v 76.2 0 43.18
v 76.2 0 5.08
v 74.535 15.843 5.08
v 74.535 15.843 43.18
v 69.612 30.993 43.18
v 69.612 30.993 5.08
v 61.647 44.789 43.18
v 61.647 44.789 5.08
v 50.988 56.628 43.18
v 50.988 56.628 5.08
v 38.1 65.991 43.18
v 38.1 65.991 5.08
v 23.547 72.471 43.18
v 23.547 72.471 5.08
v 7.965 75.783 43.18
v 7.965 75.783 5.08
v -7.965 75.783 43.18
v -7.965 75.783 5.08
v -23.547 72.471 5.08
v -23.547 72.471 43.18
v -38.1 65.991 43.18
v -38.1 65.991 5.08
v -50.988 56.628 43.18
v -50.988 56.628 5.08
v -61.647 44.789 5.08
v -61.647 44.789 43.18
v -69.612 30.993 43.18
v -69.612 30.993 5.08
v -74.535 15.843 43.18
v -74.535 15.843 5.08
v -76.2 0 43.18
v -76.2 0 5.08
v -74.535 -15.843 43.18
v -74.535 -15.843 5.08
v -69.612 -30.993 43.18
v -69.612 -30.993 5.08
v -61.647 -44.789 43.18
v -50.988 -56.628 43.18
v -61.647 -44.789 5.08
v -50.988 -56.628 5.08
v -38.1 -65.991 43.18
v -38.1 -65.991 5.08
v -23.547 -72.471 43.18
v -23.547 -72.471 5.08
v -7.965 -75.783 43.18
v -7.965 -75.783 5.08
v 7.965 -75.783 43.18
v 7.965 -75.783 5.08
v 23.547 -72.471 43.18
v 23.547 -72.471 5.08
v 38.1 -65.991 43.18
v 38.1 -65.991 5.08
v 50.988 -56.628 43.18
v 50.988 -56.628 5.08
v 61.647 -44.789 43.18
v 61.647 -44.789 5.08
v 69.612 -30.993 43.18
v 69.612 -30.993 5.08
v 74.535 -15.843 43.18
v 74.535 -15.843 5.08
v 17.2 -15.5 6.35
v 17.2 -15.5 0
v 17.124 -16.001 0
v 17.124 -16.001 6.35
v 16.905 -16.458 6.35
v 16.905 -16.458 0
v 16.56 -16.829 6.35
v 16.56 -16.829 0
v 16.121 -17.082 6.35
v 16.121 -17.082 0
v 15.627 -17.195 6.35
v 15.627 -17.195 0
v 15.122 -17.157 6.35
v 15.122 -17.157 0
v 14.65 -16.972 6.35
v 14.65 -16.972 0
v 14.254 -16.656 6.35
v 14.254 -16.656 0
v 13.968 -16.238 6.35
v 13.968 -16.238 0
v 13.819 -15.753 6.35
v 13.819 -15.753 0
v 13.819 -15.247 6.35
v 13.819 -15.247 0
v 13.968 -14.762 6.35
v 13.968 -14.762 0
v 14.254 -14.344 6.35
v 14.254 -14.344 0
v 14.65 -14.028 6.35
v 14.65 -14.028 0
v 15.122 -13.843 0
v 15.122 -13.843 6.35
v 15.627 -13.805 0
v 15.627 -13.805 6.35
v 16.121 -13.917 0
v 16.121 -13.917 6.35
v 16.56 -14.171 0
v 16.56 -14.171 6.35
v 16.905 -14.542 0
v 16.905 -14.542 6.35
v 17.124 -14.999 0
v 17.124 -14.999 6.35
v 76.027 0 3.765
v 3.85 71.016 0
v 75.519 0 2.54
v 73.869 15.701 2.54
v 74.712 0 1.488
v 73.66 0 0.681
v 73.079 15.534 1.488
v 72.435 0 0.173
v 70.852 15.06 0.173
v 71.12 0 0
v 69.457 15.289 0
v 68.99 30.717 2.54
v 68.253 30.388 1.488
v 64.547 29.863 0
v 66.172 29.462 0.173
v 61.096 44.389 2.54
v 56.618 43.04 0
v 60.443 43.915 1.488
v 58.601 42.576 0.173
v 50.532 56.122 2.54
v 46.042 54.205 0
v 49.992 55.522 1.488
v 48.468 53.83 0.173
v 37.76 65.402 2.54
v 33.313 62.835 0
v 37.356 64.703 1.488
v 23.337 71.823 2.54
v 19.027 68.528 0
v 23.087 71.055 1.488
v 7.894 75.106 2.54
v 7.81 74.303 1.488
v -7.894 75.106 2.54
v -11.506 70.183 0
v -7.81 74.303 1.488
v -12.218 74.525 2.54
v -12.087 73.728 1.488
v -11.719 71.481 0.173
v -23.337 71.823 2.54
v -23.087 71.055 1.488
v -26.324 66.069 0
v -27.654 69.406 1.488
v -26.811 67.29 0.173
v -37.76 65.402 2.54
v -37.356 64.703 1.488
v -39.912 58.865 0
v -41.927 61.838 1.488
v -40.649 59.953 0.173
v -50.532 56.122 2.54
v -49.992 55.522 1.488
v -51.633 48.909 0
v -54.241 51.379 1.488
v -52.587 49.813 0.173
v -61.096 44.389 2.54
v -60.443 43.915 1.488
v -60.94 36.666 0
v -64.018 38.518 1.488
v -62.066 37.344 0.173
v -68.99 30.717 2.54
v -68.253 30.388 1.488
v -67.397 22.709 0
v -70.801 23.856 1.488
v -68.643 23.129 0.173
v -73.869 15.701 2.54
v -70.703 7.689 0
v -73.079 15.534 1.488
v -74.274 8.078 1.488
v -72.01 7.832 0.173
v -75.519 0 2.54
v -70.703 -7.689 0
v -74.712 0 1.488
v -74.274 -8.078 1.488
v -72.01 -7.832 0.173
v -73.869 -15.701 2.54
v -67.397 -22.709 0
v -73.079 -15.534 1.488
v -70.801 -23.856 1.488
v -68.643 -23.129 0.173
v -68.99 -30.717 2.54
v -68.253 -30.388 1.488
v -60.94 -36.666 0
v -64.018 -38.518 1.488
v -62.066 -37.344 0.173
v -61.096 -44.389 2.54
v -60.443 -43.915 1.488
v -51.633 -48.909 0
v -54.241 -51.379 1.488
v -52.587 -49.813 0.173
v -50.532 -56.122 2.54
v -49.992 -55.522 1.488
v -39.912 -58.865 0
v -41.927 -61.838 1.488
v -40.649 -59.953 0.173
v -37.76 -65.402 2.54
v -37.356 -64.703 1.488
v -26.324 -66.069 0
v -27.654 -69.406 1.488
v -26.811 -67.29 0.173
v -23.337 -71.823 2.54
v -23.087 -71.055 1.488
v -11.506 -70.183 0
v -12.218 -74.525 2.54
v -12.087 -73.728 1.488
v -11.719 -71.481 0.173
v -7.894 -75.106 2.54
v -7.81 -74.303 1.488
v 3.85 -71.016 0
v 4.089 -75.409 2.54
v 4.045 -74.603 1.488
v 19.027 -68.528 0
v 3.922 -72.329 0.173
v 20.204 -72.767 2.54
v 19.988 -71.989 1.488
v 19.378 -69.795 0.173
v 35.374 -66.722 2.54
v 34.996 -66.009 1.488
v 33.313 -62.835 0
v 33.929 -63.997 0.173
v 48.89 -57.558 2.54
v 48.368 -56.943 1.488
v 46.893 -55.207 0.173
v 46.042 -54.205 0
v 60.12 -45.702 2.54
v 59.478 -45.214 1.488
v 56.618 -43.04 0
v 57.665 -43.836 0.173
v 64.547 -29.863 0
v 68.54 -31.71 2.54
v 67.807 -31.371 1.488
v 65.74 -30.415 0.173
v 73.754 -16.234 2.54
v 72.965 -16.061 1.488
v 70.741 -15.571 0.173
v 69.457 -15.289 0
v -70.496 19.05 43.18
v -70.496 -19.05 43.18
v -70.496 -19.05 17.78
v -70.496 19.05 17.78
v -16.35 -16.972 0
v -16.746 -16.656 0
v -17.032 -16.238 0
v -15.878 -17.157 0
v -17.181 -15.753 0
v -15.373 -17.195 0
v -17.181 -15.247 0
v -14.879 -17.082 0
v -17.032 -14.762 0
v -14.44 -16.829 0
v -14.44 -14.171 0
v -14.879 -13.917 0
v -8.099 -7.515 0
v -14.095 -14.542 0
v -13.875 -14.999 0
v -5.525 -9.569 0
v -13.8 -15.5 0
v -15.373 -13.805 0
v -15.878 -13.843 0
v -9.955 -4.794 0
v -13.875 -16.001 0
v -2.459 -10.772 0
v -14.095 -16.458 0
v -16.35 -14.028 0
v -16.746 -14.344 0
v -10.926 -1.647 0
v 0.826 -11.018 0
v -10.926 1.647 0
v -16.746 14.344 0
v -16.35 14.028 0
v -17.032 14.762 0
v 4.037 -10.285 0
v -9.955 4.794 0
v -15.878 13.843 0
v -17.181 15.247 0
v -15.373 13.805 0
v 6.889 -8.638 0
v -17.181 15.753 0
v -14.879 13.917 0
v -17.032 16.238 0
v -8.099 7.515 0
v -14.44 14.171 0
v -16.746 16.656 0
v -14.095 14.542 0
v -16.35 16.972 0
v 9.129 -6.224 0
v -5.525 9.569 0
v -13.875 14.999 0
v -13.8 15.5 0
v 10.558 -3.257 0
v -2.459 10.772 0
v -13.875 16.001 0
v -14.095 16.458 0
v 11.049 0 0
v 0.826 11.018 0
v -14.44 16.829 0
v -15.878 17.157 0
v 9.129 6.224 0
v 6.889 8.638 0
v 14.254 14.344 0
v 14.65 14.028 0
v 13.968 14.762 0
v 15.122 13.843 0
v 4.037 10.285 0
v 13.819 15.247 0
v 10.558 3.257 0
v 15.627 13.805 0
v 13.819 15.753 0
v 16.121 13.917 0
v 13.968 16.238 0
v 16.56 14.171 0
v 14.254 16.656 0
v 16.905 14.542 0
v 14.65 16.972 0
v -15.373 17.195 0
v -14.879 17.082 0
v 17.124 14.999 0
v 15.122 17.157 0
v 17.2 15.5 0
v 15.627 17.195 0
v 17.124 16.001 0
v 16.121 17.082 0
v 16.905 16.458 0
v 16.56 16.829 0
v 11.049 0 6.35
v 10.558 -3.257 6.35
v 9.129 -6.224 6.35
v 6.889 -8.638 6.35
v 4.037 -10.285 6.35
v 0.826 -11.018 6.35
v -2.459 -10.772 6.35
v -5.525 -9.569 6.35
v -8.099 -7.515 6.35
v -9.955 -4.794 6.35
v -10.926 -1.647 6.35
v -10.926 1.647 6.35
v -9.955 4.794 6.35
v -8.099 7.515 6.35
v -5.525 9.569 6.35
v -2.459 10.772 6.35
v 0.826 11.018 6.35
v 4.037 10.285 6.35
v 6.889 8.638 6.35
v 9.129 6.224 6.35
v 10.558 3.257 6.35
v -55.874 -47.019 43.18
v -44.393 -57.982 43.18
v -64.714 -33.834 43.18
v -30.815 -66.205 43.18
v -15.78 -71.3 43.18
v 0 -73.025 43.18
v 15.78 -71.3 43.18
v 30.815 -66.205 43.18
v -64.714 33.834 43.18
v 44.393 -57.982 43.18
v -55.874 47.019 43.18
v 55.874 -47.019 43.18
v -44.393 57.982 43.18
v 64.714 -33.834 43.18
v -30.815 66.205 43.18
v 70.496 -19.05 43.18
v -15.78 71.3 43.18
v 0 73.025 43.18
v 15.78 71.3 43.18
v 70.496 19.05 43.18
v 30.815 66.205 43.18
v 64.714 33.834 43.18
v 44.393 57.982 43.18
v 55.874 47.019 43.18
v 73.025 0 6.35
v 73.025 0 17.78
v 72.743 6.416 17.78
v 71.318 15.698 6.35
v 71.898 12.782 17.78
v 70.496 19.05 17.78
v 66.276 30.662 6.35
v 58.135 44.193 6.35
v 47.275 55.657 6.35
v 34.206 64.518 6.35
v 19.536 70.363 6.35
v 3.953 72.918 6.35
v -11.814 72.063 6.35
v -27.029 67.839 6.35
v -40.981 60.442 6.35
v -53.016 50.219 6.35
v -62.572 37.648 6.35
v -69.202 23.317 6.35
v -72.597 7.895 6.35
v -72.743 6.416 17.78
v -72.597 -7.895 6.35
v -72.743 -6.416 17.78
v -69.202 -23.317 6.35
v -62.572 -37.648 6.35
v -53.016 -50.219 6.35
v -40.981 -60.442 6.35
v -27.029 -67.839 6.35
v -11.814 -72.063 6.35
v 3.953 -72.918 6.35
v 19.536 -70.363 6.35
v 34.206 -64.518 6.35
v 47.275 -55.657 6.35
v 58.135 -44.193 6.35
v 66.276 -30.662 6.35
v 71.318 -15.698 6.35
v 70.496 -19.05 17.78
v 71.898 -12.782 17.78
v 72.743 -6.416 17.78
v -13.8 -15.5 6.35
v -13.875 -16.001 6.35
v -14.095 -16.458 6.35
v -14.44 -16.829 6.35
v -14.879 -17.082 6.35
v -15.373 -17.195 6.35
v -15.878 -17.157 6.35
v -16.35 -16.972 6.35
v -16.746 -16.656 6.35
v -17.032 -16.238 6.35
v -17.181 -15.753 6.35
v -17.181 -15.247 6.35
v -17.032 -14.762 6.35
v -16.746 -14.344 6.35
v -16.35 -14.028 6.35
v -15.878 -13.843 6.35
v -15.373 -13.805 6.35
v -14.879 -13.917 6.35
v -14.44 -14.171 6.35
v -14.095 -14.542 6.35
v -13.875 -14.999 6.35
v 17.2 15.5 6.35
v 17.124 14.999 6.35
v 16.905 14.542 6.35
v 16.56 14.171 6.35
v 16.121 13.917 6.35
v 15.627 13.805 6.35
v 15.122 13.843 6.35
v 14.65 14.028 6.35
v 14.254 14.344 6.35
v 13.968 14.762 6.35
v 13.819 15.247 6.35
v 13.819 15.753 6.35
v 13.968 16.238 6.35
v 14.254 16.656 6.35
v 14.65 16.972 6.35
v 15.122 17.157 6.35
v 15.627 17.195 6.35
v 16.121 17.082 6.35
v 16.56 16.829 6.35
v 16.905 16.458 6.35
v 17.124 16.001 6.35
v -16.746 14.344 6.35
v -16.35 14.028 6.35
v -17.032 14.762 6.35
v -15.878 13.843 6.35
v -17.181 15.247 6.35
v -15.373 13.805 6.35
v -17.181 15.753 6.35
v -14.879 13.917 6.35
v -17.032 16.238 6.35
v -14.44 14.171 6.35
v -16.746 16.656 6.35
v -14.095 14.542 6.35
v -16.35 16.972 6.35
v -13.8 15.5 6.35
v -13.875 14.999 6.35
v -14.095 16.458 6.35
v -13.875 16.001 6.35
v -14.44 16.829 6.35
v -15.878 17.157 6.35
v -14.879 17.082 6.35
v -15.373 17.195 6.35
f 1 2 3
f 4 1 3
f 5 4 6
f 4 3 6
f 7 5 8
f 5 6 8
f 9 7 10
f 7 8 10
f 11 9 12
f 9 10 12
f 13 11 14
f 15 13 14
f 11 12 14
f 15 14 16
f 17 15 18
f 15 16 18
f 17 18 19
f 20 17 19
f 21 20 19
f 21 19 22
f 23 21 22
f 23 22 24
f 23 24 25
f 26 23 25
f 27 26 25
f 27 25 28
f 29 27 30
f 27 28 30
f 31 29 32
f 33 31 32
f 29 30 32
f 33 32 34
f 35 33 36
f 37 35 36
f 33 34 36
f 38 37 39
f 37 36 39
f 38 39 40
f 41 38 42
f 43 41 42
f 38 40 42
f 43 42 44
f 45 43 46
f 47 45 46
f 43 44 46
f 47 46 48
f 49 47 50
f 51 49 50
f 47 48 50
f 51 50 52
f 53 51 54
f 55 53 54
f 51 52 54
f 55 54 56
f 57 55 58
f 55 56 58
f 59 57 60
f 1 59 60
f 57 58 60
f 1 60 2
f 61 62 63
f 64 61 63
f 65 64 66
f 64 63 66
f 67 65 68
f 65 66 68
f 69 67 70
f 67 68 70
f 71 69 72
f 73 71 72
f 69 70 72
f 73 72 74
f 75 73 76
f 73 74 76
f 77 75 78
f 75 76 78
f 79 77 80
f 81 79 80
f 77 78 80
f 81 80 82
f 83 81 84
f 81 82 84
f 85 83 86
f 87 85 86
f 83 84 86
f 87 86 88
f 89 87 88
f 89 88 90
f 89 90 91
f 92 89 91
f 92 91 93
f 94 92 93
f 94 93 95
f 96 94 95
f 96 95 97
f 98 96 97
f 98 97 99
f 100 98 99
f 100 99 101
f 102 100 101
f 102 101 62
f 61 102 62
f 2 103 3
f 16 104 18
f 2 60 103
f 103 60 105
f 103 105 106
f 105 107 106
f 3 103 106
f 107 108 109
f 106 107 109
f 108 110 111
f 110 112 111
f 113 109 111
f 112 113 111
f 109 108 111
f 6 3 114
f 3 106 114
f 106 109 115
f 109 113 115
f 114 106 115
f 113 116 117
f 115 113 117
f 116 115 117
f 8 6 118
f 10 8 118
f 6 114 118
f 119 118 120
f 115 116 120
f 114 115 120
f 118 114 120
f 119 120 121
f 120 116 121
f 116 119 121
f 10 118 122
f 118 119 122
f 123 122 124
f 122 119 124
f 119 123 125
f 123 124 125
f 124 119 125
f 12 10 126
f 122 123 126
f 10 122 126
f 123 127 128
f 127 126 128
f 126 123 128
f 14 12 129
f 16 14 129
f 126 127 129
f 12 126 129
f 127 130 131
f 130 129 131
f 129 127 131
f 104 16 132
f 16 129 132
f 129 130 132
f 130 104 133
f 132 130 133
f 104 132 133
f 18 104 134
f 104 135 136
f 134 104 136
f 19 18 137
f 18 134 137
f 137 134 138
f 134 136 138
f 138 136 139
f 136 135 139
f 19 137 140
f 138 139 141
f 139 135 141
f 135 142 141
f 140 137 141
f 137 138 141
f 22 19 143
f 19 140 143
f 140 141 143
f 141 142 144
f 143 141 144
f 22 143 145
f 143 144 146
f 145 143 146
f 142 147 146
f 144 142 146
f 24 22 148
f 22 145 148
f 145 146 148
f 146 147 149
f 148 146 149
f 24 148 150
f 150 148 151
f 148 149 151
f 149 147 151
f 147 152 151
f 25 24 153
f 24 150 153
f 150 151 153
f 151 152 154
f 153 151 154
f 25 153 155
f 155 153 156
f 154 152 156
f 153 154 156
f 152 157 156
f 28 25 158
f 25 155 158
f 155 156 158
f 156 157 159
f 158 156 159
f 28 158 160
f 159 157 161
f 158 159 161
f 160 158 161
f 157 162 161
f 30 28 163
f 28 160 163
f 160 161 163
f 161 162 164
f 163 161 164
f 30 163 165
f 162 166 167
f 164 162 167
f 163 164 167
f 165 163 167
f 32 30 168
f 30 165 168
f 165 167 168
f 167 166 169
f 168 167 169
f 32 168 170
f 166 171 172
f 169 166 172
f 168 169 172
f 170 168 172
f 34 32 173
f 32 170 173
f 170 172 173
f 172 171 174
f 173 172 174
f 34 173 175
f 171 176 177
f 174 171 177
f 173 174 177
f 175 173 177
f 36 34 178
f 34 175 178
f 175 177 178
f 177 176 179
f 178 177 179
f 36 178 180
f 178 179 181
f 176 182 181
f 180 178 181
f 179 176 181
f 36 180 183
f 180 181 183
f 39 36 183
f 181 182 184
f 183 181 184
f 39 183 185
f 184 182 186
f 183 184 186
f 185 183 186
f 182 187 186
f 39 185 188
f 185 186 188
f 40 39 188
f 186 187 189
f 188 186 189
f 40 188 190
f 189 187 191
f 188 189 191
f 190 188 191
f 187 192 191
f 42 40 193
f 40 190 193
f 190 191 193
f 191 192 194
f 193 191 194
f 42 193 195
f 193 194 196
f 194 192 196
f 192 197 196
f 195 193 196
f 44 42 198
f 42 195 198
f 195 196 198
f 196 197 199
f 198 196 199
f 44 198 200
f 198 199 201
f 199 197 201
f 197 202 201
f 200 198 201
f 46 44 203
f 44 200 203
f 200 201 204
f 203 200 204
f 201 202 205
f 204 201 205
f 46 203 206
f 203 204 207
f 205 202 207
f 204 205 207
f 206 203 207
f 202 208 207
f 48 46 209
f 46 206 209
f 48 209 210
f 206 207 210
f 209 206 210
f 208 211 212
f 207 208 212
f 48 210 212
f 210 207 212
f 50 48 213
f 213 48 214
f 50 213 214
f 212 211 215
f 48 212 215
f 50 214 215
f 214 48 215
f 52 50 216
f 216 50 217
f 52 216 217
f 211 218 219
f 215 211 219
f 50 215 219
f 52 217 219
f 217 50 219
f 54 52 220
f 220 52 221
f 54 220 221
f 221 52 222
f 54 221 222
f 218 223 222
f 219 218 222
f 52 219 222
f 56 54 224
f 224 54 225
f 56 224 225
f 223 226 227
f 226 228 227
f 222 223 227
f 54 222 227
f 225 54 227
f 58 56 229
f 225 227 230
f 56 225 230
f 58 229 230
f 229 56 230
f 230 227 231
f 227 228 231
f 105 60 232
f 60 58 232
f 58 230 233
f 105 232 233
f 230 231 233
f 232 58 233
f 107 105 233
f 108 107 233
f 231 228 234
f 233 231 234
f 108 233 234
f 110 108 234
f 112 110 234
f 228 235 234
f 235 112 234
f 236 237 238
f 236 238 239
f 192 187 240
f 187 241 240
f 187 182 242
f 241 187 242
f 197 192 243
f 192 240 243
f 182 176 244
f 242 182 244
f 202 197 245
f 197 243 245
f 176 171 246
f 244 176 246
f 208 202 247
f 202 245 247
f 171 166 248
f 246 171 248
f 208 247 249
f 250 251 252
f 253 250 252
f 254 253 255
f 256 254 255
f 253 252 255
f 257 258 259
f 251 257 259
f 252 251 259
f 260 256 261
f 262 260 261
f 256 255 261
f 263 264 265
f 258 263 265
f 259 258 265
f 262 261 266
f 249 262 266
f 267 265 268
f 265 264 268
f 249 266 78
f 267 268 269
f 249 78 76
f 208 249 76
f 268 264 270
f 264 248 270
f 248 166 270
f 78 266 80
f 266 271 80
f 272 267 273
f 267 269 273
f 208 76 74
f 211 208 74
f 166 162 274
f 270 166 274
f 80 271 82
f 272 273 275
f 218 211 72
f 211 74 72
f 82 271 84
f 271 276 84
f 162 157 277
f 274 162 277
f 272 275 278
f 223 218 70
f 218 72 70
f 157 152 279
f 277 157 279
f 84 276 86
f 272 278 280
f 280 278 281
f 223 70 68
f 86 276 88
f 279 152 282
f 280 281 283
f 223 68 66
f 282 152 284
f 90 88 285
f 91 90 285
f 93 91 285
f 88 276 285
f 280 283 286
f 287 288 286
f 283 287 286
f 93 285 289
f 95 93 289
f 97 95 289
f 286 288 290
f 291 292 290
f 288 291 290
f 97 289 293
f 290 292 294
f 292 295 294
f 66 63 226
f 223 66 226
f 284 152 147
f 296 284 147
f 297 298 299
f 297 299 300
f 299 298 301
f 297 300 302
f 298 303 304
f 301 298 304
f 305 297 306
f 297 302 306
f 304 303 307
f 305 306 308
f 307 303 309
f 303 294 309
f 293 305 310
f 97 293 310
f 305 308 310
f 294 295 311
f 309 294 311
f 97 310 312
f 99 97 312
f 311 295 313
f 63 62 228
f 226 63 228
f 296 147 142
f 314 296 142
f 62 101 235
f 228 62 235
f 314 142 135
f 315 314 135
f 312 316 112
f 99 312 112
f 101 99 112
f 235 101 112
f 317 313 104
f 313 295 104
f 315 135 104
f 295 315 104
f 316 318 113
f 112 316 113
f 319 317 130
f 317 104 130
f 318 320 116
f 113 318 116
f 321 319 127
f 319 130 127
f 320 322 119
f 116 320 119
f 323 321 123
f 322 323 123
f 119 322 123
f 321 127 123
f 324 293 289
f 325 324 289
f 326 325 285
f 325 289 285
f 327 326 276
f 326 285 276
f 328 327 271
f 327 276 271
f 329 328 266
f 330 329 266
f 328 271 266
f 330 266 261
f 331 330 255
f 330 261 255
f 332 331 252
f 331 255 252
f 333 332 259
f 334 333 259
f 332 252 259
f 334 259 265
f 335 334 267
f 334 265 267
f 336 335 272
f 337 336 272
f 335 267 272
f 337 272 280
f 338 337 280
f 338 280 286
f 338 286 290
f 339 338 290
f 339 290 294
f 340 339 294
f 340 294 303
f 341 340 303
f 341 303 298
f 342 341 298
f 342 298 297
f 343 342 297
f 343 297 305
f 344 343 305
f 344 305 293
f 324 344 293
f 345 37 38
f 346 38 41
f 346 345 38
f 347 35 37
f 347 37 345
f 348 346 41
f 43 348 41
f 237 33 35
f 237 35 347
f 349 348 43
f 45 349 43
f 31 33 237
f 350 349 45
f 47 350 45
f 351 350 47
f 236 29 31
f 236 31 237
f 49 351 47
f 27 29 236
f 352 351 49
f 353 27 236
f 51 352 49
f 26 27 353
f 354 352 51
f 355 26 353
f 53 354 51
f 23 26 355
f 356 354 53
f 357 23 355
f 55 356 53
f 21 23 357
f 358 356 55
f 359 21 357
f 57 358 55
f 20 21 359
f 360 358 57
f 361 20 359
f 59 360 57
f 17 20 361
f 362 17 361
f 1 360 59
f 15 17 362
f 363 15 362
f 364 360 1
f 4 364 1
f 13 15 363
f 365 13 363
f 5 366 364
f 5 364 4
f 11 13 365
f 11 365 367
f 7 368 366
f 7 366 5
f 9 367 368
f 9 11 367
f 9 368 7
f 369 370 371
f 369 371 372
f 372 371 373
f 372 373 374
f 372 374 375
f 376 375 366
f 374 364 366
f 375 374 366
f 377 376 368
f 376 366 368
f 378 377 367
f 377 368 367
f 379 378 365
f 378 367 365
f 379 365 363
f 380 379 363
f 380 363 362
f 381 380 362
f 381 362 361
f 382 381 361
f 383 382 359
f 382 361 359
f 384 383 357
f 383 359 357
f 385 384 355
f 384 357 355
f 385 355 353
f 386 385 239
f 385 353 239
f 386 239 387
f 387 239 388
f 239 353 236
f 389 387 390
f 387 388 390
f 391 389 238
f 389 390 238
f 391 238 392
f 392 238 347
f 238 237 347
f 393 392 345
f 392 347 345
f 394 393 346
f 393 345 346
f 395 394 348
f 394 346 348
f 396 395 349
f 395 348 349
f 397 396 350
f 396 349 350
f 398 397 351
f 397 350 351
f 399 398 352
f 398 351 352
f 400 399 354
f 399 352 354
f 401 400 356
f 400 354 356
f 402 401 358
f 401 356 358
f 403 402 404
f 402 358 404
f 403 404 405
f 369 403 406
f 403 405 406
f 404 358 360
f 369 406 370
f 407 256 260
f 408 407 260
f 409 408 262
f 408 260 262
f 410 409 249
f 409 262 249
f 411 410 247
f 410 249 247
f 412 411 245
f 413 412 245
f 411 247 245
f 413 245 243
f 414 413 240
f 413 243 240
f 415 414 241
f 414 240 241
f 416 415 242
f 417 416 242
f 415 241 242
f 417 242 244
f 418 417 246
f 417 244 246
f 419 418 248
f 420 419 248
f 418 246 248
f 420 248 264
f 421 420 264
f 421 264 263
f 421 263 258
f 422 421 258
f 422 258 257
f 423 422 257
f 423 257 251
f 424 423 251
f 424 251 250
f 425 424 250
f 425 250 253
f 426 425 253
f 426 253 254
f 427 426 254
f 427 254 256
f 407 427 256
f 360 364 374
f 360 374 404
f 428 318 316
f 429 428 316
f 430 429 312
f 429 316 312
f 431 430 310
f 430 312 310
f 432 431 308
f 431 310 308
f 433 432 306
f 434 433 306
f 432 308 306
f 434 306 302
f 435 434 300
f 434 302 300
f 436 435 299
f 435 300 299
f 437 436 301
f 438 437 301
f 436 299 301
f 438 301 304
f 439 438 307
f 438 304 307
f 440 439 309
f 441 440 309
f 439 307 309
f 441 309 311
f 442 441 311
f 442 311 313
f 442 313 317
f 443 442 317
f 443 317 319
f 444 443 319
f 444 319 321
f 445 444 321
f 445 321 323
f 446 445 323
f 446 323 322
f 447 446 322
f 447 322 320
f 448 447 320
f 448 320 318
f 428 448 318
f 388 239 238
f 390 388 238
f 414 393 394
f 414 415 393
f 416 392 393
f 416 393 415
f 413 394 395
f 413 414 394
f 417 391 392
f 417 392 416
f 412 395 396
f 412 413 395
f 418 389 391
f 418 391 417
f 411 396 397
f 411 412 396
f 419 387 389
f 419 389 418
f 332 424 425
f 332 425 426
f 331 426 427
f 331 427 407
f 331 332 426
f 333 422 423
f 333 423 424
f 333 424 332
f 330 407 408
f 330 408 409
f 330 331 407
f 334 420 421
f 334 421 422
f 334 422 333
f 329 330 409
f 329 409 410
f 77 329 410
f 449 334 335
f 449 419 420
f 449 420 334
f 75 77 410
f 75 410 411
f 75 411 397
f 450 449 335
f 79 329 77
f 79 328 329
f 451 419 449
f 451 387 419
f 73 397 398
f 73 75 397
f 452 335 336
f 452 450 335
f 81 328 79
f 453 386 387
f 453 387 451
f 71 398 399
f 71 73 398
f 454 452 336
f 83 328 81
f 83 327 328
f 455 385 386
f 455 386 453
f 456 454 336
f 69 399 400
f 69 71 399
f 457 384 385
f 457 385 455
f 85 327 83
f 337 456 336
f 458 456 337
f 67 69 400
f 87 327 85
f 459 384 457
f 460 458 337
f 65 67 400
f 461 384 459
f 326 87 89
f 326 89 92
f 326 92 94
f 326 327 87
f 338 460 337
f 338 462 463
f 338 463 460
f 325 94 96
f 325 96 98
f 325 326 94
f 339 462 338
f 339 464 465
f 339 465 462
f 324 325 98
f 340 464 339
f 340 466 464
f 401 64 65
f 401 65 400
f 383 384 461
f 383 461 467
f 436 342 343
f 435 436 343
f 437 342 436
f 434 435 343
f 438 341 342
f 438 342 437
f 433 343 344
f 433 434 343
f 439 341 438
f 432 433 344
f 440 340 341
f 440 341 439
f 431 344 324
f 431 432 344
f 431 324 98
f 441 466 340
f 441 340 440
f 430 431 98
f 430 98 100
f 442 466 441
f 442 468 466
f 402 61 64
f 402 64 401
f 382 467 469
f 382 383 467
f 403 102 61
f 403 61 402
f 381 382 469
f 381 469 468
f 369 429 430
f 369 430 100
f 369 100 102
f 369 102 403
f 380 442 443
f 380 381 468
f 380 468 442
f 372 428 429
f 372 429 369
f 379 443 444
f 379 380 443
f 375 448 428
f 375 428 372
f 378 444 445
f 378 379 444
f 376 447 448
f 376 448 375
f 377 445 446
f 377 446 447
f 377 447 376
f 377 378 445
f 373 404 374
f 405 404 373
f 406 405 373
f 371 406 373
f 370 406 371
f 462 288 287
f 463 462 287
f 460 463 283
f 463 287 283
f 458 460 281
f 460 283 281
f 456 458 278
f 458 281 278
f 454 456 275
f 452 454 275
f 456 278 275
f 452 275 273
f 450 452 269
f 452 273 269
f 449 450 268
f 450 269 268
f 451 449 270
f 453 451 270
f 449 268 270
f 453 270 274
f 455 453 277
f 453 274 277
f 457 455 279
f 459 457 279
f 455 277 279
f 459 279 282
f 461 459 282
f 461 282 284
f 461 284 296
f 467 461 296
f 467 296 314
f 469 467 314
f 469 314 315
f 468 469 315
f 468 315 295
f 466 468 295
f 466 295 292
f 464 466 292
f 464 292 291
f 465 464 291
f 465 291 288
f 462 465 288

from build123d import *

# Parameters (mm, degrees)
F0_R      = 76.2
F1_DEPTH  = 43.18
F2_R      = 73.025
F3_DEPTH  = 36.83
F4_R      = 11.049
F5_DEPTH  = 25.4
F6_R      = 1.6999966
F7_DEPTH  = 43.181
F8_R      = 5.08
F10_DEPTH = 25.4


with BuildPart() as f1:
    # F0 (on Top) → F1 (new body)
    with BuildSketch(Plane.XY):
        Circle(F0_R)
    extrude(amount=F1_DEPTH)

    # F2 (on face) → F3 (cut)
    with BuildSketch(Plane.XY.offset(43.18)):
        Circle(F2_R)
    extrude(amount=-F3_DEPTH, mode=Mode.SUBTRACT)

    # F4 (on face) → F5 (cut)
    with BuildSketch(Plane(origin=(0, 0, 0), x_dir=(1, 0, 0), z_dir=(0, 0, -1))):
        Circle(F4_R)
    extrude(amount=-F5_DEPTH, mode=Mode.SUBTRACT)

    # F6 (on face) → F7 (cut, through all)
    with BuildSketch(Plane(origin=(0, 0, 0), x_dir=(1, 0, 0), z_dir=(0, 0, -1))):
        with Locations((15.499969, 15.499969)):
            Circle(F6_R)
        with Locations((15.499969, -15.499969)):
            Circle(F6_R)
        with Locations((-15.499969, -15.499969)):
            Circle(F6_R)
        with Locations((-15.499969, 15.499969)):
            Circle(F6_R)
    extrude(amount=-F7_DEPTH, mode=Mode.SUBTRACT)

    # F8
    f8_edges = [f1.edges().sort_by_distance(p)[0] for p in [
        (-76.2, 0, 0),
    ]]
    fillet(f8_edges, radius=F8_R)

    # F9 (on face) → F10 (join)
    with BuildSketch(Plane.XY.offset(43.18)):
        with BuildLine():
            Line((-70.496440513, 0), (-70.496440513, 19.05))
            ThreePointArc((-70.496440513, 19.05), (-73.025, 0), (-70.496440513, -19.05))
            Line((-70.496440513, -19.05), (-70.496440513, 0))
        make_face()
        with BuildLine():
            ThreePointArc((73.025, 0), (72.3901001293, 9.6085393411), (70.496440513, 19.05))
            Line((70.496440513, 19.05), (70.496440513, 0))
            Line((70.496440513, 0), (70.496440513, -19.05))
            ThreePointArc((70.496440513, -19.05), (72.3901001293, -9.6085393411), (73.025, 0))
        make_face()
    extrude(amount=-F10_DEPTH)


solid = f1.part
